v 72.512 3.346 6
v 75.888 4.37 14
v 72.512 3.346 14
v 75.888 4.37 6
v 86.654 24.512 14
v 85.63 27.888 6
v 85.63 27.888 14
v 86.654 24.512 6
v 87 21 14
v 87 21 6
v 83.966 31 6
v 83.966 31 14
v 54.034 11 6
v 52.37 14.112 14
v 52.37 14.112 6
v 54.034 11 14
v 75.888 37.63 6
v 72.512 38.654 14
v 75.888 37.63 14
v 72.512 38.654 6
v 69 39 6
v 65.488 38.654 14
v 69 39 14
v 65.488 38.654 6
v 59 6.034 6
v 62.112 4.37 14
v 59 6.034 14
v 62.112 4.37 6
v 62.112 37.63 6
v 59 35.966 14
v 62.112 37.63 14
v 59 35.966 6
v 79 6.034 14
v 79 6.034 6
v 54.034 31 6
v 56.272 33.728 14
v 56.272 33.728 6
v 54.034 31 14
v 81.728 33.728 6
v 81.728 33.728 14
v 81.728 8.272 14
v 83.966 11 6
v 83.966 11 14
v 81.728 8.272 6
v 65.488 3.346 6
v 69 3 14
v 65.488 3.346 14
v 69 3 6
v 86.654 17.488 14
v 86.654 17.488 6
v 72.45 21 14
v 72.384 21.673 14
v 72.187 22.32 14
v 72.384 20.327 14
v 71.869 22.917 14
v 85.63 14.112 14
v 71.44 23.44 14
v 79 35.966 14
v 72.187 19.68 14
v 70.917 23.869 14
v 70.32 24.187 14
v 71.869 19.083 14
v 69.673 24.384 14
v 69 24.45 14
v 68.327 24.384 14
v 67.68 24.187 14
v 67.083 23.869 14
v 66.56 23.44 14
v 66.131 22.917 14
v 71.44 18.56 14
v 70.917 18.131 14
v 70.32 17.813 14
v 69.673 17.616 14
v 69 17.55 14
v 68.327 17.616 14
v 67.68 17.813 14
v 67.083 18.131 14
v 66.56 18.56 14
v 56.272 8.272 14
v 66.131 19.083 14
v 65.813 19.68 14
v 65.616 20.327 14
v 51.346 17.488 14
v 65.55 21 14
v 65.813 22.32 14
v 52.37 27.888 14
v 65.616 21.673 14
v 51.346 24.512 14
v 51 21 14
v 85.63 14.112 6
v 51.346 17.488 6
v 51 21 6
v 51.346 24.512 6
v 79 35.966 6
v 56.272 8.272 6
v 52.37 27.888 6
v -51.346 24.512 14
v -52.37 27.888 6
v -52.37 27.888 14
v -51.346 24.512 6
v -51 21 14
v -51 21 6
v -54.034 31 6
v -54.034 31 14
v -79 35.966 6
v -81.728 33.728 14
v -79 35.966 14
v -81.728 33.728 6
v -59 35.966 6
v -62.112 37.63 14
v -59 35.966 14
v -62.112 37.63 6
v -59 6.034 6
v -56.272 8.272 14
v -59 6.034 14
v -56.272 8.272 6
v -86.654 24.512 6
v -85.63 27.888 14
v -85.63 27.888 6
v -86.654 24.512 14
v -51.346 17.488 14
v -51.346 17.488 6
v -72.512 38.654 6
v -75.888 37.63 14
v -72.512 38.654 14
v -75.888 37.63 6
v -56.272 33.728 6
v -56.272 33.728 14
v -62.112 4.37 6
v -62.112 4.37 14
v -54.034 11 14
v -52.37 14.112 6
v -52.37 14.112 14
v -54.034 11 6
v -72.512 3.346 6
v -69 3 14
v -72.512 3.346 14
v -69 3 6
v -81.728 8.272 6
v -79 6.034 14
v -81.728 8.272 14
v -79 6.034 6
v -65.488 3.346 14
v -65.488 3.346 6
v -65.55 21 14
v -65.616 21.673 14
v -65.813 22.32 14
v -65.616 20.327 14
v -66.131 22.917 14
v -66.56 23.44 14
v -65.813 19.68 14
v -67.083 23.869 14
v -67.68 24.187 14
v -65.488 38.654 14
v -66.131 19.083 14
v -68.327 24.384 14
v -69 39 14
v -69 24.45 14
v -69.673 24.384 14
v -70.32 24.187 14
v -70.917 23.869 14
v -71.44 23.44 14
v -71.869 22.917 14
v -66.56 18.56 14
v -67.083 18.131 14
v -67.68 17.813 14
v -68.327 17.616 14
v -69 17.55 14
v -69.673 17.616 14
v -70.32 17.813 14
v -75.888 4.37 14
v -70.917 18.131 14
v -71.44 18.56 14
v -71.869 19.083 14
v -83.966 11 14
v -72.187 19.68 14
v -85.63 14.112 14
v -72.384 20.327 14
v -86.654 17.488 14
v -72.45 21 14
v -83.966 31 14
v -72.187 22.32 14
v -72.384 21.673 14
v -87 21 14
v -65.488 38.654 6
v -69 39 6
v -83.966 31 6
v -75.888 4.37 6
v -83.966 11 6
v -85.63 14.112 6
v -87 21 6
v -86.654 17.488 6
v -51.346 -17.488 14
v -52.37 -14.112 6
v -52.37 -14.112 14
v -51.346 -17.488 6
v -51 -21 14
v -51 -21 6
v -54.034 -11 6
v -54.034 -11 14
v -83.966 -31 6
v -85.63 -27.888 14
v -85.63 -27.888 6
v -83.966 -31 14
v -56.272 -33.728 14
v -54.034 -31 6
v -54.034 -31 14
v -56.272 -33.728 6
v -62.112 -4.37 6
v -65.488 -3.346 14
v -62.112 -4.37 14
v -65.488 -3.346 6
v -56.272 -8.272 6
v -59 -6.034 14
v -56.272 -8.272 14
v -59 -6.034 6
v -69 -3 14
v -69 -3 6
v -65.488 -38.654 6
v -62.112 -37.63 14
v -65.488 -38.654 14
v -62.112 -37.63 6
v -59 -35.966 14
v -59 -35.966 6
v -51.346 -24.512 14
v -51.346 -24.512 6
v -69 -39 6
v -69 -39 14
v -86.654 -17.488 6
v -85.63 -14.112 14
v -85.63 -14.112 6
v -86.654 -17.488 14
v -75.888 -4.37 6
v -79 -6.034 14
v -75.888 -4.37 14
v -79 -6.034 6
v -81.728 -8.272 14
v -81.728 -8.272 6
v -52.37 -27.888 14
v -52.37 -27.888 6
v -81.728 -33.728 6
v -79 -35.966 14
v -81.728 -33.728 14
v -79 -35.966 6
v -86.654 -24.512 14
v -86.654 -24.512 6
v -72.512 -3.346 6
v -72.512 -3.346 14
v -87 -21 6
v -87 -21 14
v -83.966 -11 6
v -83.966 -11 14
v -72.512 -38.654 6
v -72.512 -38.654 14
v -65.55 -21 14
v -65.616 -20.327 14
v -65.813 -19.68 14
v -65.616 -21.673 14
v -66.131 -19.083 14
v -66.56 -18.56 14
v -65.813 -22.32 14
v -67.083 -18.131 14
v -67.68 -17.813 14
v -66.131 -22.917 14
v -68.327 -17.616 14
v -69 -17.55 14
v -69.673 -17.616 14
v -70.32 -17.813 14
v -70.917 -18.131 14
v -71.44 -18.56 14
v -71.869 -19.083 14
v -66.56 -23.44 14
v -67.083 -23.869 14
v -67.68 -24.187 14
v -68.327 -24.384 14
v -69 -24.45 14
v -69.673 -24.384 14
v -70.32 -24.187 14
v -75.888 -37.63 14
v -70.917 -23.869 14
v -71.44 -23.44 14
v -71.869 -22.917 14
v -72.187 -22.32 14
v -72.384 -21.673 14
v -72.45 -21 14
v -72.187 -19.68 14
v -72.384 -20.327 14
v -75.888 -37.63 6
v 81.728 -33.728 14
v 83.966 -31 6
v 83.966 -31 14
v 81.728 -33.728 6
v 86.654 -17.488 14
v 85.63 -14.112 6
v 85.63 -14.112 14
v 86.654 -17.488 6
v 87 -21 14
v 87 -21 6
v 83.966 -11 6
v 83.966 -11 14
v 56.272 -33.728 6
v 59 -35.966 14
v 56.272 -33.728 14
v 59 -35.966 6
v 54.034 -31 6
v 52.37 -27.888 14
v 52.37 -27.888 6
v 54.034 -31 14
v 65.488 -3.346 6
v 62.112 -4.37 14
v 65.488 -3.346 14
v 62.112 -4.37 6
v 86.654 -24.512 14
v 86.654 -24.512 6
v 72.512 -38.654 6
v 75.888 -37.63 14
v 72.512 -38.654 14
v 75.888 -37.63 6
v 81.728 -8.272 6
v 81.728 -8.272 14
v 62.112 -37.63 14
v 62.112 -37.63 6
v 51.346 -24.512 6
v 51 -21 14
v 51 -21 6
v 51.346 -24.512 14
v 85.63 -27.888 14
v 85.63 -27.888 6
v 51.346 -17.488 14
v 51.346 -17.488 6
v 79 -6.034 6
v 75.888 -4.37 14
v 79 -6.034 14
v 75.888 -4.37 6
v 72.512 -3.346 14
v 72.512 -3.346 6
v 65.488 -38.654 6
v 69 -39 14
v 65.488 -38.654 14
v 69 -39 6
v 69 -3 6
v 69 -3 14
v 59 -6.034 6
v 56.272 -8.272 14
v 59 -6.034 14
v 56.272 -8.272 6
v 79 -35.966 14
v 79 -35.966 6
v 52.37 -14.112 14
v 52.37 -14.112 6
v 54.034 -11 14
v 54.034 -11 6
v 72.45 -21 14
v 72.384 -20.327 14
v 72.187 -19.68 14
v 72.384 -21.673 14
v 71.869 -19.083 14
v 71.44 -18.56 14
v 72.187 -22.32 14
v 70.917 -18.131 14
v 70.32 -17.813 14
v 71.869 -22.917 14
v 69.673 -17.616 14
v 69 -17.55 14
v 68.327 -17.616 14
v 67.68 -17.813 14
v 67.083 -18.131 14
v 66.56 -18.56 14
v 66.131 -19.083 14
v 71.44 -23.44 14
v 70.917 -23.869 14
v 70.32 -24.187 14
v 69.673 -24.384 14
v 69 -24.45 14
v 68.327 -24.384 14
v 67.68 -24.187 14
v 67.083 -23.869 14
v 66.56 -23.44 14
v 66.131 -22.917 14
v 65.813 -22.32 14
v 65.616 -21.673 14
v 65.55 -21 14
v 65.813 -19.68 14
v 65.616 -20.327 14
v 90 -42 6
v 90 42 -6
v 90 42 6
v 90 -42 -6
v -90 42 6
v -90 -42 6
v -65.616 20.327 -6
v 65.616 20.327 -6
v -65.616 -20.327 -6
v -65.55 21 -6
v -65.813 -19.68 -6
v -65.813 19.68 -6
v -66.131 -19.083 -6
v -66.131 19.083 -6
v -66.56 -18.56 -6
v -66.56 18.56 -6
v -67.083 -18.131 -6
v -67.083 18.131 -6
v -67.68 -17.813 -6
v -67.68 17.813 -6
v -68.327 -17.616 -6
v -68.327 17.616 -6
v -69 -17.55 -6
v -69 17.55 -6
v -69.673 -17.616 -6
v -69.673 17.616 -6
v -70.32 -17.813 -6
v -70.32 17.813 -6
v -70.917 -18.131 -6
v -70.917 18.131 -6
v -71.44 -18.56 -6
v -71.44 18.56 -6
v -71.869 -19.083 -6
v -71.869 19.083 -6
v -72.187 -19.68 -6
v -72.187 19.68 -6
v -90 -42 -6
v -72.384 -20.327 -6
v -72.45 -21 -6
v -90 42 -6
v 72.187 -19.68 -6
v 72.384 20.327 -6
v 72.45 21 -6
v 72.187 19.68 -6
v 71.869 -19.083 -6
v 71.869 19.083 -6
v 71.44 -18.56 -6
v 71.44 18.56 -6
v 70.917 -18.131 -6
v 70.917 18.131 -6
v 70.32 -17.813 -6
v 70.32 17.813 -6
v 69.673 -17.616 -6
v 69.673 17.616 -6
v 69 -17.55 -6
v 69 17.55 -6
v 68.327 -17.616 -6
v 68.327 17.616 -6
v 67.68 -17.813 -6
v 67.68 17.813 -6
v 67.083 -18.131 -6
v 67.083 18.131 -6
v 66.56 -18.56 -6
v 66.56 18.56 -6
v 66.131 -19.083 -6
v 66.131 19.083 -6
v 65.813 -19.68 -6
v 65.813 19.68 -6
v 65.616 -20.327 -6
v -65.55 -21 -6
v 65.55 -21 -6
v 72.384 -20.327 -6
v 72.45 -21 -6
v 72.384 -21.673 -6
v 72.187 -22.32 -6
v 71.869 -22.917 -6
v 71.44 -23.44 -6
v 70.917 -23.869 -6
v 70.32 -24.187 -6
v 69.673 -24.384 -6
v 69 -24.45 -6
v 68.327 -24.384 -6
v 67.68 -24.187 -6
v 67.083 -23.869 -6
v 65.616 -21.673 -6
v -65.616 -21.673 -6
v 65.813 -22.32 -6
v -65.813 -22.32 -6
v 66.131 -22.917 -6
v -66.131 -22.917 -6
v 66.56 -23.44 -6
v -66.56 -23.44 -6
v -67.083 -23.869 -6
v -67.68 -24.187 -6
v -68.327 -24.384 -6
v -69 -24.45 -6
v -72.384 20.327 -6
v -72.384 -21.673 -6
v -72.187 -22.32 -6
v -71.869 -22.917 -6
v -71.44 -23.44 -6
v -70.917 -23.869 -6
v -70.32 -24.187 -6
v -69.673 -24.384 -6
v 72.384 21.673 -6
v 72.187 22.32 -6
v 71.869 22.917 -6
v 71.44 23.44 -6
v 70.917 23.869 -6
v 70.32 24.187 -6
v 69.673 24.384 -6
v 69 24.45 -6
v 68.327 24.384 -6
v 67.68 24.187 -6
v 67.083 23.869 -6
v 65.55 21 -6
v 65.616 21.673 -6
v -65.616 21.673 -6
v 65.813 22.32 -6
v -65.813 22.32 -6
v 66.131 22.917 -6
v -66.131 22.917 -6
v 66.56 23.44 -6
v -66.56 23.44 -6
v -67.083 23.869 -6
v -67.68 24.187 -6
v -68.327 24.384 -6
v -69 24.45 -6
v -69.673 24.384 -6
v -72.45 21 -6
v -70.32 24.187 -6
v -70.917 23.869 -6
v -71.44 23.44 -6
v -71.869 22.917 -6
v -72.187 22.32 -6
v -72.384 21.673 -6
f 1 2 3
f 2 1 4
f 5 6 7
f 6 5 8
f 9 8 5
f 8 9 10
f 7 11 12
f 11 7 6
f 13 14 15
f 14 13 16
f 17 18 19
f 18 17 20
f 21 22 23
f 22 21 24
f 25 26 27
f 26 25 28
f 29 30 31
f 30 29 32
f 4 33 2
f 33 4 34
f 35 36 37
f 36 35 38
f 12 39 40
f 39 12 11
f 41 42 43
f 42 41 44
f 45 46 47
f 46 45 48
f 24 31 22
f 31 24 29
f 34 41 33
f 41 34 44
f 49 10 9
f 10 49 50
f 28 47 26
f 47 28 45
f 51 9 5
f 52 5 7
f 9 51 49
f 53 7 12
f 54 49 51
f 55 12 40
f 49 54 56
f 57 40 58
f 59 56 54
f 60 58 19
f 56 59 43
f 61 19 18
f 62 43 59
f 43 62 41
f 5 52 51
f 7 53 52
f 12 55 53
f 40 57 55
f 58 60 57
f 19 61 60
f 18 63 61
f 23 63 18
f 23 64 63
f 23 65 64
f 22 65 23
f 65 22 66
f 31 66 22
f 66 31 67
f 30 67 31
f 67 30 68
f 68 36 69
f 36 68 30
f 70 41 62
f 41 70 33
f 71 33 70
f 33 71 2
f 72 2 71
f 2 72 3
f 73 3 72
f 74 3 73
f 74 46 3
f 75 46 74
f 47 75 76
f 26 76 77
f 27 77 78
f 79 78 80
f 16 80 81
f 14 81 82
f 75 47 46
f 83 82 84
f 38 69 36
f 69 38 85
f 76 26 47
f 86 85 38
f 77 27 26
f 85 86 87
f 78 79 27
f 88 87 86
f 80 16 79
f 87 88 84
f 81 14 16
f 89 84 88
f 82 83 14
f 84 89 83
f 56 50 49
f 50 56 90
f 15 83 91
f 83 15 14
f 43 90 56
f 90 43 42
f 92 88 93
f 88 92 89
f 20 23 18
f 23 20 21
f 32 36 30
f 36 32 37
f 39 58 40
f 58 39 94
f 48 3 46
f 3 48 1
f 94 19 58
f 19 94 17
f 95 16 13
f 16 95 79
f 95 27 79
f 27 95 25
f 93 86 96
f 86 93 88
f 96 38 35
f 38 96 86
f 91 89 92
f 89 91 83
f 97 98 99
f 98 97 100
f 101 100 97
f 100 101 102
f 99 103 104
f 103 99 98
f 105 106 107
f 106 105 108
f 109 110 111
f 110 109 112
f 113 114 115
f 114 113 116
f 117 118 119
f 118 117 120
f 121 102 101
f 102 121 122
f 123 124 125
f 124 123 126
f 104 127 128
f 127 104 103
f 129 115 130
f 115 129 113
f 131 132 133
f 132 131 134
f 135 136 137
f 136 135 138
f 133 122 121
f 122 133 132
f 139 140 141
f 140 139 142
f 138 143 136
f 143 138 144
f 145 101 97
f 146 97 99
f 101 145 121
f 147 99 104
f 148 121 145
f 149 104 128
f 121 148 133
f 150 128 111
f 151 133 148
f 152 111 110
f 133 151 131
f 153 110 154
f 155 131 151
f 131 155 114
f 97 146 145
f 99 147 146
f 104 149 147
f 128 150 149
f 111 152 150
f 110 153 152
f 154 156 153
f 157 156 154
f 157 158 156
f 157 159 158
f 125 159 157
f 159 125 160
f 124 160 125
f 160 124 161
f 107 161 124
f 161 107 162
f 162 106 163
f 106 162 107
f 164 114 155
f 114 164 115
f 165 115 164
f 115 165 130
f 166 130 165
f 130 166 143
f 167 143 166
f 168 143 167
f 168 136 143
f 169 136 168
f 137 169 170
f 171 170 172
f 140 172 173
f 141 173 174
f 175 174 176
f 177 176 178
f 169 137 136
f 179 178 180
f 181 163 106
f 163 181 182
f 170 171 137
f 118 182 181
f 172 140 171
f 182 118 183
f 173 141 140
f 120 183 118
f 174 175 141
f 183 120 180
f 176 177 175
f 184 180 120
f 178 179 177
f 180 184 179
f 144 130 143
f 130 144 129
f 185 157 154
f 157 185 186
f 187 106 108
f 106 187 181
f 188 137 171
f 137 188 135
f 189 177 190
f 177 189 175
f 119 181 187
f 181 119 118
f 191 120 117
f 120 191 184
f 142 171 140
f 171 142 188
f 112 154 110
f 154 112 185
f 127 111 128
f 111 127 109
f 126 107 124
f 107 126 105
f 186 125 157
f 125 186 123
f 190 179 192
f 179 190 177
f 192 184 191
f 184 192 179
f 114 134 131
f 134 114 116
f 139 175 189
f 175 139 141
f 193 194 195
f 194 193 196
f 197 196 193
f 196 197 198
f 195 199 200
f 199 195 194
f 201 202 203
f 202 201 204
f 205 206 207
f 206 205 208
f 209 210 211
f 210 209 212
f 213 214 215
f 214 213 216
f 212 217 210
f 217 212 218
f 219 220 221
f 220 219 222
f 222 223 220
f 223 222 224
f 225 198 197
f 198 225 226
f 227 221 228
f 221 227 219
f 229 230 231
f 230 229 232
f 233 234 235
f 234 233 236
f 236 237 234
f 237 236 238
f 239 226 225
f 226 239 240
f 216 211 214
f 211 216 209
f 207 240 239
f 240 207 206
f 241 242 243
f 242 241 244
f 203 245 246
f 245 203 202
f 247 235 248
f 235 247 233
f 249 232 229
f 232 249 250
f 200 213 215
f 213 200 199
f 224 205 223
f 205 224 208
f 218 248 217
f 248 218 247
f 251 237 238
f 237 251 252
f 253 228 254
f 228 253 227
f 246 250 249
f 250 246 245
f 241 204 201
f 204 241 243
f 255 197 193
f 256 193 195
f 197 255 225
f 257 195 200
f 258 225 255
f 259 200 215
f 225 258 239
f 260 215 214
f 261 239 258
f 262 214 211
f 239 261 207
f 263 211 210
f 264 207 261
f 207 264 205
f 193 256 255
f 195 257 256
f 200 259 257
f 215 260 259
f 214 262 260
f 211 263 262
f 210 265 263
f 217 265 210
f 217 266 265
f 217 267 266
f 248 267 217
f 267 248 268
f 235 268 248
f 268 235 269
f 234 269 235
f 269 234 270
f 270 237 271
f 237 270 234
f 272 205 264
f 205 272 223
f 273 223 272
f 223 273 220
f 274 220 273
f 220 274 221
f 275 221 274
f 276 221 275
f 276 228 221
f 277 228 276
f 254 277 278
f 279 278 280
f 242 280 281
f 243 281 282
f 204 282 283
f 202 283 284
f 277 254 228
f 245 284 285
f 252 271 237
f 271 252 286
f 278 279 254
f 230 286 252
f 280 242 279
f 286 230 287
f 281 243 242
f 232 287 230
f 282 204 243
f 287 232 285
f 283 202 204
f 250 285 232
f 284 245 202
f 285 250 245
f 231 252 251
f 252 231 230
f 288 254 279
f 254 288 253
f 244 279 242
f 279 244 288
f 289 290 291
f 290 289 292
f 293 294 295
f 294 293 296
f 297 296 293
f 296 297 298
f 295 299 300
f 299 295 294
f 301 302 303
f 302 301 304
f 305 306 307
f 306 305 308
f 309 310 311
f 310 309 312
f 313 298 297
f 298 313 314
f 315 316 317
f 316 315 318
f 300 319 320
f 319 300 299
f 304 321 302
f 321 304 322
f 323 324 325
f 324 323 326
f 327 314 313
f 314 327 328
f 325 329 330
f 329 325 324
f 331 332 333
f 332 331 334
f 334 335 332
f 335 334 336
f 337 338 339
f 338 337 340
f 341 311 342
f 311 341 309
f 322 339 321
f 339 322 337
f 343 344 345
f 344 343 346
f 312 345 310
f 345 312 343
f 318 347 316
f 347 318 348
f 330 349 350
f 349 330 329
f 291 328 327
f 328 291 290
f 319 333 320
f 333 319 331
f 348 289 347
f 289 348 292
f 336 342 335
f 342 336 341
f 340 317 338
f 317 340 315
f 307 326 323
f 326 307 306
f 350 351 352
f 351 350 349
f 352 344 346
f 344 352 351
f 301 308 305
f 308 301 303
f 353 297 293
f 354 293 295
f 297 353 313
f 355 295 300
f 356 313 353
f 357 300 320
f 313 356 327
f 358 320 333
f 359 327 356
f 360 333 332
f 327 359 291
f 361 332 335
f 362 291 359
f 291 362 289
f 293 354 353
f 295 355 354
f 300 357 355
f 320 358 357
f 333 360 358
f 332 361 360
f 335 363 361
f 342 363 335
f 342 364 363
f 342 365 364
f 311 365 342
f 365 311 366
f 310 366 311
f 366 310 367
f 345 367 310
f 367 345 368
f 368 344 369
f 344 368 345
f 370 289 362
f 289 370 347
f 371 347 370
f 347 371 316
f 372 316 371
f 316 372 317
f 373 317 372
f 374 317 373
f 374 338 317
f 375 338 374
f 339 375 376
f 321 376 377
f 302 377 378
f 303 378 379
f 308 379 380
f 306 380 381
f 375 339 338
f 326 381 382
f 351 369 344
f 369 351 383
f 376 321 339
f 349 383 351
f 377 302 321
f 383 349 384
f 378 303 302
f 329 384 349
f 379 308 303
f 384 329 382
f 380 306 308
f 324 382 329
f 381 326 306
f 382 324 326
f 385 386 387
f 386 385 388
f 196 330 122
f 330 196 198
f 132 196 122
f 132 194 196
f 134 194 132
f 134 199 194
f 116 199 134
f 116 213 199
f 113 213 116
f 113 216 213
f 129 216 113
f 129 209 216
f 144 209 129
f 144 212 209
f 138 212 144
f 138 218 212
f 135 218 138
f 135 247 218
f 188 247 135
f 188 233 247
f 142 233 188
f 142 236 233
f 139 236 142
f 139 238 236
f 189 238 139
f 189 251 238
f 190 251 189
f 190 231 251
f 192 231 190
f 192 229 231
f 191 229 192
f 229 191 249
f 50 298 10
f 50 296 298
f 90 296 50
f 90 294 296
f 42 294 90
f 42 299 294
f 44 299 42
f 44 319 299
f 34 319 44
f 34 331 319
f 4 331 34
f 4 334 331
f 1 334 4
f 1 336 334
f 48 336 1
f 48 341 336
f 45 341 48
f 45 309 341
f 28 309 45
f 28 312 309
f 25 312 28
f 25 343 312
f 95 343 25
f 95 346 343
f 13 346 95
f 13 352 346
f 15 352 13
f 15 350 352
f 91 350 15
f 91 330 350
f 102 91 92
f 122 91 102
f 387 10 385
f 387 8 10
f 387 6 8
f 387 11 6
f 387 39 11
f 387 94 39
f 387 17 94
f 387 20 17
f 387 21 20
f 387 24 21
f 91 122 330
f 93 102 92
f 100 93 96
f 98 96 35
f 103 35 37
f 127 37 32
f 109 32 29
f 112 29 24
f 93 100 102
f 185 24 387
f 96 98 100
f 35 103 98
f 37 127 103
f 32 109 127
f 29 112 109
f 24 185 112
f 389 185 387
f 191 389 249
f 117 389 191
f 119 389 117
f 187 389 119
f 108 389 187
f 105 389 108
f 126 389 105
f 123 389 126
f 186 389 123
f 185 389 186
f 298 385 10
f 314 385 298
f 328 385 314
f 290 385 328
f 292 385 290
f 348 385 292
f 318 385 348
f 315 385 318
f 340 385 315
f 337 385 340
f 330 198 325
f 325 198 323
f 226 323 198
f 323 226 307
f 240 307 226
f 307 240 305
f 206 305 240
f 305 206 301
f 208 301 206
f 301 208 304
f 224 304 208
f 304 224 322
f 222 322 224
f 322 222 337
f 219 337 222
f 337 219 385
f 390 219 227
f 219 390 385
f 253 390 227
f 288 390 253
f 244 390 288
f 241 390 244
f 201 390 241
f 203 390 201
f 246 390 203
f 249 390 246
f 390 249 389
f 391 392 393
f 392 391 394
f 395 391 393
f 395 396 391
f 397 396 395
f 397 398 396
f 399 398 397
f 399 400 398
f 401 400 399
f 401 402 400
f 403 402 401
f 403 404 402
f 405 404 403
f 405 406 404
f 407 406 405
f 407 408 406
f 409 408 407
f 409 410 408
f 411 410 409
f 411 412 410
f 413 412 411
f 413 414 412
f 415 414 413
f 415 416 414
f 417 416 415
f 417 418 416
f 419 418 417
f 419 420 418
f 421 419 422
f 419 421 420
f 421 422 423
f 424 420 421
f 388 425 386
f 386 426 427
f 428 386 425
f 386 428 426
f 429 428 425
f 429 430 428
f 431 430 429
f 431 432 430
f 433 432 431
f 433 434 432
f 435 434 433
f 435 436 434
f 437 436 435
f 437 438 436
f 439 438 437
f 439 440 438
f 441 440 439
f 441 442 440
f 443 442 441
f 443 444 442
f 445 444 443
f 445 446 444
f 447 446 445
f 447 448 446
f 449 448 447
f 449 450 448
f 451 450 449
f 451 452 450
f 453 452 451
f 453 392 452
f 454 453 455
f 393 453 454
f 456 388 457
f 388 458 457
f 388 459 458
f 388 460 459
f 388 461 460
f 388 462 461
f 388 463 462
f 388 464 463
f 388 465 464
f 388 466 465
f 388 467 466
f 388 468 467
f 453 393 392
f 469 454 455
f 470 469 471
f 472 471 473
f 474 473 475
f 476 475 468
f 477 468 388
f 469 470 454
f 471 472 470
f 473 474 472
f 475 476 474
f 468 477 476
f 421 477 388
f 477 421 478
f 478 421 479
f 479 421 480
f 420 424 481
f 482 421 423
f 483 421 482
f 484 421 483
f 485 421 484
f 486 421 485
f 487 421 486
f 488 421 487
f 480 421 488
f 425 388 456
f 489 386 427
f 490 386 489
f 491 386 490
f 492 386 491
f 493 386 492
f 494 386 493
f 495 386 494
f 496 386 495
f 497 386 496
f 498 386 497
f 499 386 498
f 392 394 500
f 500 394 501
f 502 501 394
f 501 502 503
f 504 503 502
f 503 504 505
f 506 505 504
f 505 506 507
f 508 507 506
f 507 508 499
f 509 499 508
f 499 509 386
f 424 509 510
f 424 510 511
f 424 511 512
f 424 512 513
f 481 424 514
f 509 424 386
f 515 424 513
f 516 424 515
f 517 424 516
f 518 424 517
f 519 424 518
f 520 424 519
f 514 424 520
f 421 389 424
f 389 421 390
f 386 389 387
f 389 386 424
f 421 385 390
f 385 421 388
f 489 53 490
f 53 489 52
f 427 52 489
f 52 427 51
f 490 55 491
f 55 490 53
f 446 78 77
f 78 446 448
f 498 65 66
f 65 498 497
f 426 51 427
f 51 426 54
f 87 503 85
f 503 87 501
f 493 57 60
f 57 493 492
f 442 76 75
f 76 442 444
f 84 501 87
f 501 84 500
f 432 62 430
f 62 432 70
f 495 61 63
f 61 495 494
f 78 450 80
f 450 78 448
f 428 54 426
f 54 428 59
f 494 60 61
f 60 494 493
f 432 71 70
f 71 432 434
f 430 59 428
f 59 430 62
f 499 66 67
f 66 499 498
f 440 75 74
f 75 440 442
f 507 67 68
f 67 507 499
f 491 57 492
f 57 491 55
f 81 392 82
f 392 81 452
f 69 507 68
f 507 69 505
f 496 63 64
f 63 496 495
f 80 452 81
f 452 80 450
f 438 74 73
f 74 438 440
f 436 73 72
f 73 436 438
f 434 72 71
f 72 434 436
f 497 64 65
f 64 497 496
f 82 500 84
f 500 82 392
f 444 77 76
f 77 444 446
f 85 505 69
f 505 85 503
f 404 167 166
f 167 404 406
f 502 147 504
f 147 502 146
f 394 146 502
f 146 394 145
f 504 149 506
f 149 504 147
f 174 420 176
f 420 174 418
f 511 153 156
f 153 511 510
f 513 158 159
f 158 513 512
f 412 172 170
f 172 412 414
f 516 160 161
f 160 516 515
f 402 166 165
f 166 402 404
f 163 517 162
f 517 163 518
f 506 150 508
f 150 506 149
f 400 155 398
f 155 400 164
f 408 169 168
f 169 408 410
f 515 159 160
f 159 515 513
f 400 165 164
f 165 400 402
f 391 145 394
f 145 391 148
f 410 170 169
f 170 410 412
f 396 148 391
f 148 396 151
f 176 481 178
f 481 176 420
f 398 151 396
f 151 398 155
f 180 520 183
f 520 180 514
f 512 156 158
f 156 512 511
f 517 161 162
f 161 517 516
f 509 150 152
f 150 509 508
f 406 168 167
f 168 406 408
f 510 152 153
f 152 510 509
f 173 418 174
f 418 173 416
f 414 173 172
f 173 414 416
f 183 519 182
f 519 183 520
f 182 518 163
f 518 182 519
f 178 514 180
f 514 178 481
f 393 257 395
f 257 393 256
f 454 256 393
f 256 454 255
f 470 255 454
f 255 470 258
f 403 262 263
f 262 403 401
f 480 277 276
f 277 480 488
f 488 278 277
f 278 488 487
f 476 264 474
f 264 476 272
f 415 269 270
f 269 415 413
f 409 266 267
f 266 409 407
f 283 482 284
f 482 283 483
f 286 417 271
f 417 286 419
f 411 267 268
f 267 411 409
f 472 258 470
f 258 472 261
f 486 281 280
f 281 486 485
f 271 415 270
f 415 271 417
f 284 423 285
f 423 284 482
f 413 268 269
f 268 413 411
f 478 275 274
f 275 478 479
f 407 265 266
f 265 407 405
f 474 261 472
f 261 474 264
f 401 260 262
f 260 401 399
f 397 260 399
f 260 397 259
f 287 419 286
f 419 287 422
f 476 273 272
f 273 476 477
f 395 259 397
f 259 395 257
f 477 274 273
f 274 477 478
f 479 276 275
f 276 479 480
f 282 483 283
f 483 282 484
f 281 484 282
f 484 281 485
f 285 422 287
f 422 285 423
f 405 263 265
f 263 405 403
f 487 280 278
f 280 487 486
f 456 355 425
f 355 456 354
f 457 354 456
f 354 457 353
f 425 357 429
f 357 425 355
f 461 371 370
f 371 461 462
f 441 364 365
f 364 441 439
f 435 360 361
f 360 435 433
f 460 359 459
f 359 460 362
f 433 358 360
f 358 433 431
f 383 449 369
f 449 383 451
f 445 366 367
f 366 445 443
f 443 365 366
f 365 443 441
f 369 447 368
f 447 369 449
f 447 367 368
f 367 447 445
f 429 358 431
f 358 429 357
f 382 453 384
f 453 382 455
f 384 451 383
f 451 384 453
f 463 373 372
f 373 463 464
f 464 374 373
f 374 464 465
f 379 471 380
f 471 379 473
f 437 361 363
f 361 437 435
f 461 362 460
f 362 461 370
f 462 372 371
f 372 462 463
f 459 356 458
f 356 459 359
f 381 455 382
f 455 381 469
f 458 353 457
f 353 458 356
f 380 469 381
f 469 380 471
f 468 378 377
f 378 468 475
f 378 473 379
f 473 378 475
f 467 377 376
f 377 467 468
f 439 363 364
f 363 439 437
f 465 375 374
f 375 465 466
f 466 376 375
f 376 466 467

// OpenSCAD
$fn = 32;

// ----------------------------------------------------------------------
// Anchor pads 180 x 84 x 20
// four corner bosses with anchor holes
// ----------------------------------------------------------------------

// --- parameters (mm) ---
plate = [180, 84, 12];  // base plate size (x, y, z)
pads = 4;               // boss count, one per corner
edge = 21;              // boss centre offset from the plate edge
boss_d = 36;            // boss diameter
boss_h = 8;             // boss height above the base plate
bore_d = 6.6;           // nominal hole diameter from the drawing
print_allowance = 0.3;  // clearance added for printing

// --- derived feature positions (mm) ---
hole_d = bore_d + print_allowance;  // = 6.9   hole diameter as printed
height = plate[2] + boss_h;         // = 20   overall height of the part
corner_x = plate[0] / 2 - edge;     // = 69   boss centre X
corner_y = plate[1] / 2 - edge;     // = 21   boss centre Y
feature_centers = [
  [corner_x, corner_y],
  [-corner_x, corner_y],
  [-corner_x, -corner_y],
  [corner_x, -corner_y]
];   // boss centres, anchor holes are drilled there

// base plate, four bosses standing on it, anchor holes all the way through
difference() {
  union() {
    cube(plate, center = true);
    for (centre = feature_centers)
      translate([centre[0], centre[1], plate[2] / 2 - 1])
        cylinder(d = boss_d, h = boss_h + 1);
  }
  for (centre = feature_centers)
    translate([centre[0], centre[1], -height])
      cylinder(d = hole_d, h = 2 * height + 2);  // through boss and plate
}
